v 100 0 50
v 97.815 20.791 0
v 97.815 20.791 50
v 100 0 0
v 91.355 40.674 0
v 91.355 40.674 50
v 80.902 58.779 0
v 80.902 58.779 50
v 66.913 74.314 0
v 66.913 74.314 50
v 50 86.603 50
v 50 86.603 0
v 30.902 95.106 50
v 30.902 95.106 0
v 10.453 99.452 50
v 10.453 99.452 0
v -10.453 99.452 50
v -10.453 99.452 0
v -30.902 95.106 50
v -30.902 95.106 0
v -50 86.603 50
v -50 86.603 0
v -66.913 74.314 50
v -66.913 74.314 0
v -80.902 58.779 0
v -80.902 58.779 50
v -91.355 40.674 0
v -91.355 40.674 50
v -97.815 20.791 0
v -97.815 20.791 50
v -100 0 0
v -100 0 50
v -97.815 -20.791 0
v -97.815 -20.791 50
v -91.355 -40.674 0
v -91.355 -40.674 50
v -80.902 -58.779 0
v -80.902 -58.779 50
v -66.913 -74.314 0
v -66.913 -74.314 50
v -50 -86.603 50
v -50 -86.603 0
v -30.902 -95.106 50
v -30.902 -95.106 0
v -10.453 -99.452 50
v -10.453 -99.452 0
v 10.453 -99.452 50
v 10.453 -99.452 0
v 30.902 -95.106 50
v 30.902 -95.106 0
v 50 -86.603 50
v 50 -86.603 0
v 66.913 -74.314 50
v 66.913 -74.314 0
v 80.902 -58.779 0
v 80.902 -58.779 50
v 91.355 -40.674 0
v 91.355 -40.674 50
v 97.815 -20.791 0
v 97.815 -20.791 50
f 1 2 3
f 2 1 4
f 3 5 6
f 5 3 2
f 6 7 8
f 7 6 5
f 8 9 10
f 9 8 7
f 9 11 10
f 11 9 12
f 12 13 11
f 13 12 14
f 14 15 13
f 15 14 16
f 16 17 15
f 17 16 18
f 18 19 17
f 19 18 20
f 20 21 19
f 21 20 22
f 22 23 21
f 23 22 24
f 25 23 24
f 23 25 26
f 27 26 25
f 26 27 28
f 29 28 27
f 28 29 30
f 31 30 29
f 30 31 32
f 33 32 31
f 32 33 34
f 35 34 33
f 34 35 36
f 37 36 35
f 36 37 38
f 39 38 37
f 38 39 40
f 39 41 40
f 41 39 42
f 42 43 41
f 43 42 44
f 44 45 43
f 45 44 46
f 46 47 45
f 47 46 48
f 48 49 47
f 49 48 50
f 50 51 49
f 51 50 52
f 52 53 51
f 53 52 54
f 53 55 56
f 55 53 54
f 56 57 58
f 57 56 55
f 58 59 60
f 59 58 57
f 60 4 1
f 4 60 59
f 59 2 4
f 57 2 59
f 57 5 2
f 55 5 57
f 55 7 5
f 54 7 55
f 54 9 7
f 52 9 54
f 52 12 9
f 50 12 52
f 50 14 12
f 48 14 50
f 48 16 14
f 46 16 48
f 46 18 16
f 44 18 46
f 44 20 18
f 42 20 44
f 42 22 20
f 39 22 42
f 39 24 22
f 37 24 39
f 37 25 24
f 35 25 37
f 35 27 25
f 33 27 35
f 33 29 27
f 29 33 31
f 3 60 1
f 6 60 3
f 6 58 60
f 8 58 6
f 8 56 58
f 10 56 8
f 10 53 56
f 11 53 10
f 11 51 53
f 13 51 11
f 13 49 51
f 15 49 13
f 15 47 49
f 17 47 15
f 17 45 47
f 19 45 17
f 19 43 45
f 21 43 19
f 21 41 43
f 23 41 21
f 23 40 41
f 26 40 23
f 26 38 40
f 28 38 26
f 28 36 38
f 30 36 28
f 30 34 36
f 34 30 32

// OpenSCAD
my_h=50;
my_r=100;
echo("This is a cylinder with h=", my_h, " and r=", my_r);
echo(my_h=my_h,my_r=my_r); // shortcut
cylinder(h=my_h, r=my_r);

a=1.0;
b=1.000002;
echo(a);
echo(b);

if(a==b){ //while echoed the same, the values are still distinct
    echo ("a==b");
}else if(a>b){
    echo ("a>b");
}else if(a<b){
    echo ("a<b");
}else{
    echo ("???");
}

c=1000002;
d=0.000002;
echo(c); //1e+06
echo(d); //2e-06

a = 3; b = 5;

// echo() prints values before evaluating the expression
r1 = echo(a, b) a * b; // ECHO: 3, 5

// using let it's still easy to output the result
r2 = let(r = 2 * a * b) echo(r) r; // ECHO: 30

// use echo statement for showing results
echo(r1, r2); // ECHO: 15, 30

v = [4, 7, 9, 12];
function result(x) = echo(result = x) x;
function sum(x, i = 0) = echo(str("x[", i, "]=", x[i])) result(len(x) > i ? x[i] + sum(x, i + 1) : 0);
echo("sum(v) = ", sum(v));
